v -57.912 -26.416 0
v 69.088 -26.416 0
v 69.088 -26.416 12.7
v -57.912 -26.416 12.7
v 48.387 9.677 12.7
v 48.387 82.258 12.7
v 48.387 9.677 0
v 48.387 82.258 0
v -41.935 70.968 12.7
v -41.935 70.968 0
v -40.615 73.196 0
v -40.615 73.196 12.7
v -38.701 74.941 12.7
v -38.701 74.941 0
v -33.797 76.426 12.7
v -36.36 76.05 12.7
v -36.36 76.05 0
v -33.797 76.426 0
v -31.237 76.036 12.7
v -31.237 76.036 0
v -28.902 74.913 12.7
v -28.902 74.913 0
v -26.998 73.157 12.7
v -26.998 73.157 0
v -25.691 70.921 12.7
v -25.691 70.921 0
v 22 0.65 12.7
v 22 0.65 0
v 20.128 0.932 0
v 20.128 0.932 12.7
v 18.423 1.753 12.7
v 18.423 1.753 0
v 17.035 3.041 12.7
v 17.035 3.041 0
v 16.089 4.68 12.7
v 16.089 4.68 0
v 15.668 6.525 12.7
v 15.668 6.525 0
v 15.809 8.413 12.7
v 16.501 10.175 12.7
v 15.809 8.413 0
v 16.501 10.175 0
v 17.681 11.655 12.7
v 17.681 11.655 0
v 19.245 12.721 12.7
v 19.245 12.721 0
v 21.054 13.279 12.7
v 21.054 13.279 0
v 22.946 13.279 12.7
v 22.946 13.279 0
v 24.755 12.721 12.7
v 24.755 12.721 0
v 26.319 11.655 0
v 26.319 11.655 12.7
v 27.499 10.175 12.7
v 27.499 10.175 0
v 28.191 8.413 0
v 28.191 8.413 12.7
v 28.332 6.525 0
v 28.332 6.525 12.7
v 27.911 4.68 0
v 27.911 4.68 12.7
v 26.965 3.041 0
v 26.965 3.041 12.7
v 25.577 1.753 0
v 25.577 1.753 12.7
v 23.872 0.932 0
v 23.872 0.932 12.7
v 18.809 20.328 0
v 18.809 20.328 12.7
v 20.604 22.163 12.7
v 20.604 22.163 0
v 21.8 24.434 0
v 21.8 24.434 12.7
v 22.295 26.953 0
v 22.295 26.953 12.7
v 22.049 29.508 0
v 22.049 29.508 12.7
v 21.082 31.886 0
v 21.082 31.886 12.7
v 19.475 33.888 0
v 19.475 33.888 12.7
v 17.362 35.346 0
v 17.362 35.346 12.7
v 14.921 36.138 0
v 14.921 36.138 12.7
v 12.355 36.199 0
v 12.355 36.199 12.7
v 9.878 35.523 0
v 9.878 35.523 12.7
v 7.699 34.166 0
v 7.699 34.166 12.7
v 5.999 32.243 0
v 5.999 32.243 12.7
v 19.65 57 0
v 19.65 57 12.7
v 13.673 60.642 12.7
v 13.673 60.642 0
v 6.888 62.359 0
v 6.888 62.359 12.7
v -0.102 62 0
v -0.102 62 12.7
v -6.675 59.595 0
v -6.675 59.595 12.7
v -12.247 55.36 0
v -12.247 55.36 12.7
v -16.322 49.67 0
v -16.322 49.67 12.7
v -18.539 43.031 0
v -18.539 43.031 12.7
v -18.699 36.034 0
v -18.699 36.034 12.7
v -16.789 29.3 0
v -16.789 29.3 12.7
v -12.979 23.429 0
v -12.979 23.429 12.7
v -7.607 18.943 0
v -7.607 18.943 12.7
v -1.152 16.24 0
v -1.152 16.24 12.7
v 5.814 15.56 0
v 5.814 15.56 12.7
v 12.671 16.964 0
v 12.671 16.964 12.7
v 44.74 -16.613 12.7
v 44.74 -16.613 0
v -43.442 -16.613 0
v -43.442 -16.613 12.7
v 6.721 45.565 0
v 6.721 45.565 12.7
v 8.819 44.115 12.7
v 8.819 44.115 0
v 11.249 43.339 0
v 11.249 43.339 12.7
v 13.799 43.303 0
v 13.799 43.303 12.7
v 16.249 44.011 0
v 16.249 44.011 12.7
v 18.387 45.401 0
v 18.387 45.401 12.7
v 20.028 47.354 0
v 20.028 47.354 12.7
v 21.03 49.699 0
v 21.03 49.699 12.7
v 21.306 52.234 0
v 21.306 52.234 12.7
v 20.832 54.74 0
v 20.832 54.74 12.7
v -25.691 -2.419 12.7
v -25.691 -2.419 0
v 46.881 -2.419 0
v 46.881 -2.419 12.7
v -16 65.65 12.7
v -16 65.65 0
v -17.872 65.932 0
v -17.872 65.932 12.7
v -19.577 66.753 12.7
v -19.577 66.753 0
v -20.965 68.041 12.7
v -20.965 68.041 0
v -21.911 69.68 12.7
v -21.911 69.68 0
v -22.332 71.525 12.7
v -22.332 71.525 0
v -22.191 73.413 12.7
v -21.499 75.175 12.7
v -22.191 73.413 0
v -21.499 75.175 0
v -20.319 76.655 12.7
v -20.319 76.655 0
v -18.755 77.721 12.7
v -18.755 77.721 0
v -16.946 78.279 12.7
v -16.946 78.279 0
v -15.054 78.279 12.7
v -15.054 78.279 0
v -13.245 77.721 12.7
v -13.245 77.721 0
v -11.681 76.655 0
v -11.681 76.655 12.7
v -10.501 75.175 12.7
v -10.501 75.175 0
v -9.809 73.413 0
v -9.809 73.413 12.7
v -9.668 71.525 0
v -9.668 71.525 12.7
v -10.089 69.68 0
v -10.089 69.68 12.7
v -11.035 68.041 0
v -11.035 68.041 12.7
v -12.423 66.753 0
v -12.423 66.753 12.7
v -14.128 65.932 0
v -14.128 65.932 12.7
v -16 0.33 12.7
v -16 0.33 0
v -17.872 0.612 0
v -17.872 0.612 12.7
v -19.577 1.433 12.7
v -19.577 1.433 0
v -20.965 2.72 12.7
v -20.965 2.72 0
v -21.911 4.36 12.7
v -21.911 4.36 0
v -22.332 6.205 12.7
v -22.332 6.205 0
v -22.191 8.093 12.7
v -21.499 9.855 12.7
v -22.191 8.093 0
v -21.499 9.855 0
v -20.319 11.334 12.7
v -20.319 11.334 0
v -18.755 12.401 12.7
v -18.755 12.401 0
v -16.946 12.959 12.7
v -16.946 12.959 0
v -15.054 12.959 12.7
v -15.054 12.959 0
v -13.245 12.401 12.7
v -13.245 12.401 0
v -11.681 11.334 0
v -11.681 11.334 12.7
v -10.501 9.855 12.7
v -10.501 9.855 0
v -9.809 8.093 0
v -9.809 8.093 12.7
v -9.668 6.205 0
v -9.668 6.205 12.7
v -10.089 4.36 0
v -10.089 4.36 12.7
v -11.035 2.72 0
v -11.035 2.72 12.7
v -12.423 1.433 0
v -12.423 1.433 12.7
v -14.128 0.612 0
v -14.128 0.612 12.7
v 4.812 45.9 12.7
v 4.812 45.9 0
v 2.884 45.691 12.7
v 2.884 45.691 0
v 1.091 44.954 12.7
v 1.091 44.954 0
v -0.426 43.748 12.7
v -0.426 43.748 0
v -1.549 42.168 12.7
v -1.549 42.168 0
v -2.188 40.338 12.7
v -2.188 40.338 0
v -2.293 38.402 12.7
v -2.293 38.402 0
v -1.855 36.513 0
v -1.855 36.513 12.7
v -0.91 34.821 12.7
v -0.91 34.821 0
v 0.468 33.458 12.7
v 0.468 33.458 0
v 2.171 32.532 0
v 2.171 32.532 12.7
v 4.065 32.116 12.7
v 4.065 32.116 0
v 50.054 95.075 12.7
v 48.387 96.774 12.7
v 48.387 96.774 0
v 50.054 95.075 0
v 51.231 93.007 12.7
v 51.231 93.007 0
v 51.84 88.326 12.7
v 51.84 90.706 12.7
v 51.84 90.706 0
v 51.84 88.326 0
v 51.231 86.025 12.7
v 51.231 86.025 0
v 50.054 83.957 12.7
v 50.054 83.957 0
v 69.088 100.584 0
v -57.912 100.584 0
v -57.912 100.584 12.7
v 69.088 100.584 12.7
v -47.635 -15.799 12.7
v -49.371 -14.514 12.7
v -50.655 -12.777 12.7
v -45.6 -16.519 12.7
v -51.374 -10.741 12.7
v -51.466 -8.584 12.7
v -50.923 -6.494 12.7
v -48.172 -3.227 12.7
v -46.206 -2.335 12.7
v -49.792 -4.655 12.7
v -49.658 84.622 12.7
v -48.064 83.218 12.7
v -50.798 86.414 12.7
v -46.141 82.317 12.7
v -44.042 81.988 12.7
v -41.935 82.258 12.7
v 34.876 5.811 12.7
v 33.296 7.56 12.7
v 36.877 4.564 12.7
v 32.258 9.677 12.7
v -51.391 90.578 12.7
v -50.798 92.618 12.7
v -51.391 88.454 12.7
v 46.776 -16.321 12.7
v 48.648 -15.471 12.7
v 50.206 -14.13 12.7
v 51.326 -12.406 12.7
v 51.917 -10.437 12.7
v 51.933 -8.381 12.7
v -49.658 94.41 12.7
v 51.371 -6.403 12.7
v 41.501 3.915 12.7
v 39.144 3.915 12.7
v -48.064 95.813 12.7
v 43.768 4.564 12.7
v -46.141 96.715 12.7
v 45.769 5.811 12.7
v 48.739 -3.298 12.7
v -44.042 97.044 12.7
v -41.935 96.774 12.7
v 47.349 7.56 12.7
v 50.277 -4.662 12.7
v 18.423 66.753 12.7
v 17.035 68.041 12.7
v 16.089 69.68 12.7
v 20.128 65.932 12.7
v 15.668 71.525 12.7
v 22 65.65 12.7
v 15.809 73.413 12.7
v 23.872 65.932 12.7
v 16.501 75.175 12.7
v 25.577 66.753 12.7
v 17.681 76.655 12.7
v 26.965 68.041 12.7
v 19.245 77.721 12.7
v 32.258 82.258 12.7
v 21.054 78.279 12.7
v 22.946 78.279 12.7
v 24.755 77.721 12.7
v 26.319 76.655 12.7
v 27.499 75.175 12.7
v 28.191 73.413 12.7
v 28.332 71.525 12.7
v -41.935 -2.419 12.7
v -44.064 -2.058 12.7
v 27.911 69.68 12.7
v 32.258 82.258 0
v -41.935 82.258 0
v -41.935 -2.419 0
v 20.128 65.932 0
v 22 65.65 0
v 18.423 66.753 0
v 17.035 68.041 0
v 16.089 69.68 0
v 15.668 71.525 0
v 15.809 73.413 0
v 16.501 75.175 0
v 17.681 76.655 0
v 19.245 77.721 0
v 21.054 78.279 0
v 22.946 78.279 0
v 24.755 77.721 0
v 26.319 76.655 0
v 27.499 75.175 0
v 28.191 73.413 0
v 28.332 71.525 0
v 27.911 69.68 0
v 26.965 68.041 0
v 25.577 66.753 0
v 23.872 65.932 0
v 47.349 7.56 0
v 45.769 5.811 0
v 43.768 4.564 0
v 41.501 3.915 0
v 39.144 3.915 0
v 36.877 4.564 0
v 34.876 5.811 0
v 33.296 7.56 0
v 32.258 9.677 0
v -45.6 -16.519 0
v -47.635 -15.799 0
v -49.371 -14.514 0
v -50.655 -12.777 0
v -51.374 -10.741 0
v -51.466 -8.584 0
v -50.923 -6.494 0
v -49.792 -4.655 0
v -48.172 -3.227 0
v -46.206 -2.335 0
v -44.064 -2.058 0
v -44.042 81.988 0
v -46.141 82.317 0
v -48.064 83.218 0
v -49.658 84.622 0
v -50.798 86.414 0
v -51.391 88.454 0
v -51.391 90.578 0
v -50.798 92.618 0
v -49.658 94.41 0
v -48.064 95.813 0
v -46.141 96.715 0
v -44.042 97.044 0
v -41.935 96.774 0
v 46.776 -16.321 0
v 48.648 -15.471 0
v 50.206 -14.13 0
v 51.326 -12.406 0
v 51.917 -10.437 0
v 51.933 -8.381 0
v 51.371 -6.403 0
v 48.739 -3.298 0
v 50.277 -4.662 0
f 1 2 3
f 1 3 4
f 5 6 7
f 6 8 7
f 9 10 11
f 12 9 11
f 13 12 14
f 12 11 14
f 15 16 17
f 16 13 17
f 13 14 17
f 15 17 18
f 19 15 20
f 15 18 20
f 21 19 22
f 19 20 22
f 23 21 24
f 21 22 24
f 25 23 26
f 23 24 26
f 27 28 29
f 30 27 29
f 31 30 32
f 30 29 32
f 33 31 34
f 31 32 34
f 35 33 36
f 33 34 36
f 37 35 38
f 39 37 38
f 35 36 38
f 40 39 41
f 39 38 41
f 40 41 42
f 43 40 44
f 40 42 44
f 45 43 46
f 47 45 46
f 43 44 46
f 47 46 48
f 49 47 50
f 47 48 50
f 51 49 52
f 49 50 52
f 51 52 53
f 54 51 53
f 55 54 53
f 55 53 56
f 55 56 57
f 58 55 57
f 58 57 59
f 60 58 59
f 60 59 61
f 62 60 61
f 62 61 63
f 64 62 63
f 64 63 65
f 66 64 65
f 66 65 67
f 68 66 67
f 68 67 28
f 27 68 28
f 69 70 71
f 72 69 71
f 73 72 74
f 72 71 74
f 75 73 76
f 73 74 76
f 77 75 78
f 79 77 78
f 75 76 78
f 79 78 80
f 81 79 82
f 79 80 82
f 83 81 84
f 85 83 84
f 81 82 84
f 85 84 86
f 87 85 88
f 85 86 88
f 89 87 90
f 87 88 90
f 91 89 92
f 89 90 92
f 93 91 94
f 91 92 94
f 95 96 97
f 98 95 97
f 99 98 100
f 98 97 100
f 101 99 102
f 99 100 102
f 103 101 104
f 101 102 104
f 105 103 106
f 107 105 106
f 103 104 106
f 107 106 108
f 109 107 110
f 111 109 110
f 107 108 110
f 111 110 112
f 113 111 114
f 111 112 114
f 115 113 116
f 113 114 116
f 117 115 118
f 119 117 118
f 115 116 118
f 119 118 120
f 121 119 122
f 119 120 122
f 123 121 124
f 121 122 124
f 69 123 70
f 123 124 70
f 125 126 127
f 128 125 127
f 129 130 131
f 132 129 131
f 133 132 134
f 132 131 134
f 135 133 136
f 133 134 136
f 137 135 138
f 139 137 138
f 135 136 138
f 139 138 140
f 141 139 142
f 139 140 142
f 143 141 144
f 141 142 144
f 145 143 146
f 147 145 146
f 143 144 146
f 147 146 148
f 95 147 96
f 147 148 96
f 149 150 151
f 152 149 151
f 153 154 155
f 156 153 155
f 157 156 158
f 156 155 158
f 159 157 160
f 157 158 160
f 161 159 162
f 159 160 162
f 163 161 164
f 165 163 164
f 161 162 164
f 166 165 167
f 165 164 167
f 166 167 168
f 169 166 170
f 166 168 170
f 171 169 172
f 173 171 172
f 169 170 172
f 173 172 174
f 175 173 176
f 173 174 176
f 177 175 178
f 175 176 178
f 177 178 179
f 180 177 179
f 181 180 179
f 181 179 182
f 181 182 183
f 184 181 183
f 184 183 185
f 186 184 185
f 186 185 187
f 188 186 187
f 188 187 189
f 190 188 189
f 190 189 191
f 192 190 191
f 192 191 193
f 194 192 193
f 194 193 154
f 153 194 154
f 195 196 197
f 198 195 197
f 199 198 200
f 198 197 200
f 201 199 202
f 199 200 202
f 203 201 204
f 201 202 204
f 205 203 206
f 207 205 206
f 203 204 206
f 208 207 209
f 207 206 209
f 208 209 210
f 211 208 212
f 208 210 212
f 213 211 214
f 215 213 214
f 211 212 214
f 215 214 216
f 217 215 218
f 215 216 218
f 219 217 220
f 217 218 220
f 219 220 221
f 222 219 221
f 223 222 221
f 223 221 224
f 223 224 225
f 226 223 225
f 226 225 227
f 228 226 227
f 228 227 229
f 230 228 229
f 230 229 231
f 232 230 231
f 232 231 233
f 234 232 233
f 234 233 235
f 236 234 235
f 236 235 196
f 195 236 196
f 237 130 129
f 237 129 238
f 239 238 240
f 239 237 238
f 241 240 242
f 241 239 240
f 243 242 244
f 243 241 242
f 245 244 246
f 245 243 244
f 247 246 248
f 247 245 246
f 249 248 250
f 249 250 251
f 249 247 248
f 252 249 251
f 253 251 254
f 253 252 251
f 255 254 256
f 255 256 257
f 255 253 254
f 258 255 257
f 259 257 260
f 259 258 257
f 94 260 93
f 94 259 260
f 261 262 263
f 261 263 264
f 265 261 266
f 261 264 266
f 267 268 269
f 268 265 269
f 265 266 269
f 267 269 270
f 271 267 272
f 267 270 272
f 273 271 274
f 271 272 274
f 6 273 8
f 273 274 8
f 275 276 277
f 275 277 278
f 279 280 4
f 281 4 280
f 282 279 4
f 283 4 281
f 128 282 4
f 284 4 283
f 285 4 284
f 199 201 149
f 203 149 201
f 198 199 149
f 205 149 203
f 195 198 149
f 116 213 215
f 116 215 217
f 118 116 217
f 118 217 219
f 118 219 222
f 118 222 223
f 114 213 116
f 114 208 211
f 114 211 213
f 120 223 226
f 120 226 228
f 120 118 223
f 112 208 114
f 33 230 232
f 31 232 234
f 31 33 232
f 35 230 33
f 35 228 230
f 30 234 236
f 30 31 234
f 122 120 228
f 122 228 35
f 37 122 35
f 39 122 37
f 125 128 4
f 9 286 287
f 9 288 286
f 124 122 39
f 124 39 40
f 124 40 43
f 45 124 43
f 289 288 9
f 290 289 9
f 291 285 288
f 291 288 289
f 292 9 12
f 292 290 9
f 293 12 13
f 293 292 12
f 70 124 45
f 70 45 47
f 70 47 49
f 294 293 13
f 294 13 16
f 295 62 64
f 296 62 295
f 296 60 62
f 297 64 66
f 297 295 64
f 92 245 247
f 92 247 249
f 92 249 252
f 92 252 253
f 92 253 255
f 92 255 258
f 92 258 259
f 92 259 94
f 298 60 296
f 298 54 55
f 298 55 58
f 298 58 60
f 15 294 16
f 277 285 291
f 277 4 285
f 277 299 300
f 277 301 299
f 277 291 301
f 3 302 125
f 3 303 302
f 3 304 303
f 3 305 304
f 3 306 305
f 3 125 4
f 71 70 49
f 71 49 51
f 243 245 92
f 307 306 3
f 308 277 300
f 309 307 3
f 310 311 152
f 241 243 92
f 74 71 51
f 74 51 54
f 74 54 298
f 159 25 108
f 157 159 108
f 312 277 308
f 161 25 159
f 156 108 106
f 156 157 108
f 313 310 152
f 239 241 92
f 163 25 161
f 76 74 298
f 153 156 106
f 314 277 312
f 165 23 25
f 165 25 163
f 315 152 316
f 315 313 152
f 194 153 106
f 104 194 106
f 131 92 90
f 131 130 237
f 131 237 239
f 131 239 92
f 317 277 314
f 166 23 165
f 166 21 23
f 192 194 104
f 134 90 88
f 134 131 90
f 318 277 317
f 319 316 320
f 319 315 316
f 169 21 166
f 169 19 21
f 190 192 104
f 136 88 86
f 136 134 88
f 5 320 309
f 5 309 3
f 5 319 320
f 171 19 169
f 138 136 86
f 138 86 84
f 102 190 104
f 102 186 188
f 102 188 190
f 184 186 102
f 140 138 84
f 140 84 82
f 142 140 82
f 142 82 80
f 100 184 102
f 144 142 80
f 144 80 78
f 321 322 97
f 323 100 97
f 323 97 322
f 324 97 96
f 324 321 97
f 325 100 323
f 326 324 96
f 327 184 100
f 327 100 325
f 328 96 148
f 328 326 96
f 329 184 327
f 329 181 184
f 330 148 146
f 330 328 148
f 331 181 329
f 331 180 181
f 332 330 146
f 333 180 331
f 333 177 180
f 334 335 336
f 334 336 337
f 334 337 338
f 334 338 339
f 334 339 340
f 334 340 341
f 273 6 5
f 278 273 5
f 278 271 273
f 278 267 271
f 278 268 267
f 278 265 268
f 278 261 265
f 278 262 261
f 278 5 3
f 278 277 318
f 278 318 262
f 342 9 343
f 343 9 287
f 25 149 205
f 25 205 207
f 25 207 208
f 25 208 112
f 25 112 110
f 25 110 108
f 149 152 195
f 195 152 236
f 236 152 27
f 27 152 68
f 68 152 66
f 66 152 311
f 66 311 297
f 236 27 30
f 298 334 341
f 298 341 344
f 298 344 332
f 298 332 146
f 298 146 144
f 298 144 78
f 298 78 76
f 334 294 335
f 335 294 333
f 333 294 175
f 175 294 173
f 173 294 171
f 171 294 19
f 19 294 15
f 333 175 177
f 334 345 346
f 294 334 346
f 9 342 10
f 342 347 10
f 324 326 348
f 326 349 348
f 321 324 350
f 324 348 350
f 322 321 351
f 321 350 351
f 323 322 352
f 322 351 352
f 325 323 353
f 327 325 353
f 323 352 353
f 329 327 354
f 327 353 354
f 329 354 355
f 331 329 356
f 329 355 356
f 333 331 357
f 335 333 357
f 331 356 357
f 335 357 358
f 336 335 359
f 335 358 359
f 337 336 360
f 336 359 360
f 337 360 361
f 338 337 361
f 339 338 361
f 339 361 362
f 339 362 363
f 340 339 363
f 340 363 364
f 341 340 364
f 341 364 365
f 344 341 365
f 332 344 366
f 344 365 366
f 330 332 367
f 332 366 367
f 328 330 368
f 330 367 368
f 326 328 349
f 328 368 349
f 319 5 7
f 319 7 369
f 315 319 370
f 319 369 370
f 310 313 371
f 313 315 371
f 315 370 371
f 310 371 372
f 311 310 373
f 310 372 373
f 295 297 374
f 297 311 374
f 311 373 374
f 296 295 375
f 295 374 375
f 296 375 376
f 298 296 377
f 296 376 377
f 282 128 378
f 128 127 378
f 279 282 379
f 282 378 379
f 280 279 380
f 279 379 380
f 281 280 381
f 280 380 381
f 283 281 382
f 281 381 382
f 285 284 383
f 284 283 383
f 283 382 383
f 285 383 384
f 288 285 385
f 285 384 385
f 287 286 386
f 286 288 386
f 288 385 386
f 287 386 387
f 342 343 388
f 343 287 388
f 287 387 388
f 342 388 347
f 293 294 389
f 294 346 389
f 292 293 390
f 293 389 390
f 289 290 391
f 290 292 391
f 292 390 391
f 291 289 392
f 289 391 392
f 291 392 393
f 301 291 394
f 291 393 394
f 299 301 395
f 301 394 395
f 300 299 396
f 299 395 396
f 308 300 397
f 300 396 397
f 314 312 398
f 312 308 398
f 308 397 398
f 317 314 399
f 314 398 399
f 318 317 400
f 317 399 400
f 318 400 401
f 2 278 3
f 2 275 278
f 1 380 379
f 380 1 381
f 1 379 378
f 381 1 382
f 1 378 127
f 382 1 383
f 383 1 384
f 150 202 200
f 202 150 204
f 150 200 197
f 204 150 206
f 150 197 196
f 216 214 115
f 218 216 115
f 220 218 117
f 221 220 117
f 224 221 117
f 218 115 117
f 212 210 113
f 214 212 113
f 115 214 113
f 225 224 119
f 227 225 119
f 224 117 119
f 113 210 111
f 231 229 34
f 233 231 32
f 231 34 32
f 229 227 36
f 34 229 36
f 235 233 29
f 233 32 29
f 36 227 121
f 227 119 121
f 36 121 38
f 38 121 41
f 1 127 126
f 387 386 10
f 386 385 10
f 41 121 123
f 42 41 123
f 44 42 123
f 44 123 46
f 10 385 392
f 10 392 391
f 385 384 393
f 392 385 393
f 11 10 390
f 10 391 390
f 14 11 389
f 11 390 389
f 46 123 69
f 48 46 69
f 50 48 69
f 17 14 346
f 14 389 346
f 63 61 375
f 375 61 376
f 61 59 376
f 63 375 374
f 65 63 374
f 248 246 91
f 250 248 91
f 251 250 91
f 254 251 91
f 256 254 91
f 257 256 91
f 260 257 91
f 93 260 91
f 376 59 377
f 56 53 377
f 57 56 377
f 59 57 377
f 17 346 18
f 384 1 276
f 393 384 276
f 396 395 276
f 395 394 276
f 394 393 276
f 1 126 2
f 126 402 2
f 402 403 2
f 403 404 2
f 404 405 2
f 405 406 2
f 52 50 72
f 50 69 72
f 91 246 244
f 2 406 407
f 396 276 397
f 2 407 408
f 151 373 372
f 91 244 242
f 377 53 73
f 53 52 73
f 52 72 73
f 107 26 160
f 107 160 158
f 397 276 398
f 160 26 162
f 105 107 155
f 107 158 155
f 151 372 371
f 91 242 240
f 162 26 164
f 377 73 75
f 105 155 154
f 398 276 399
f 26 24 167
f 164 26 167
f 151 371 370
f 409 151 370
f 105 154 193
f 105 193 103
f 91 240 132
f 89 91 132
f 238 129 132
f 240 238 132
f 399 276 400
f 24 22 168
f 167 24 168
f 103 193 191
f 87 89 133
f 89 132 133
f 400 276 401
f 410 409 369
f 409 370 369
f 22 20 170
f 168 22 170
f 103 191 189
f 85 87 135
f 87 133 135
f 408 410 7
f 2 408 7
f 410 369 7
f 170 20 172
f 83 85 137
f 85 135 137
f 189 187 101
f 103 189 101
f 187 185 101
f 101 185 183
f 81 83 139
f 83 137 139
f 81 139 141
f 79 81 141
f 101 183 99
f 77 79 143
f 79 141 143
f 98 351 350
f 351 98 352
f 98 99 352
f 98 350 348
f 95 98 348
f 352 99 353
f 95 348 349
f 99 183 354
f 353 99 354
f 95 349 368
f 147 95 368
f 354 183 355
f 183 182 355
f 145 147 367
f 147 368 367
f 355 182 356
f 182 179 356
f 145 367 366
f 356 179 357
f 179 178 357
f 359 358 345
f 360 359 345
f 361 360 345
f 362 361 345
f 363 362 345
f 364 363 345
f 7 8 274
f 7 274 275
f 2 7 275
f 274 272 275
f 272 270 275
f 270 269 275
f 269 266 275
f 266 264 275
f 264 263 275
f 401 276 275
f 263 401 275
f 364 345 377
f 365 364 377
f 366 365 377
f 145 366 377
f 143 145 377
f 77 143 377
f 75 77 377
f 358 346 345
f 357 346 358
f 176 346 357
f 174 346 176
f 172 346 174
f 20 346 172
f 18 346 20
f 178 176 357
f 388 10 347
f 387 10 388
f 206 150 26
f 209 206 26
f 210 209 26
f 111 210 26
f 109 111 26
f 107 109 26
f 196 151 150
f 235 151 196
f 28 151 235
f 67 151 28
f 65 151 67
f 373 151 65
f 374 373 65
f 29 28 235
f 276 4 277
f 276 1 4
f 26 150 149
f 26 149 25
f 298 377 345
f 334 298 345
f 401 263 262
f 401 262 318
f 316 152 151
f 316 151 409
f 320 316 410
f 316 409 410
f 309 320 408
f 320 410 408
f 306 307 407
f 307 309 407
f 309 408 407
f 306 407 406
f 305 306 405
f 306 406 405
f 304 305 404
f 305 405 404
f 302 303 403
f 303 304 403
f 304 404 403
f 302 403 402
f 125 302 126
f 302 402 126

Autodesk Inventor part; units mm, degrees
ref_plane "YZ Plane" through (0, 0, 0) normal (1, 0, 0) x (0, 1, 0)
ref_plane "XZ Plane" through (0, 0, 0) normal (0, 1, 0) x (-1, 0, 0)
ref_plane "XY Plane" through (0, 0, 0) normal (0, 0, 1) x (1, 0, 0)
sketch "Sketch1" plane through (0, 0, 0) normal (0, 0, 1) x (1, 0, 0)
  line L0 (44.7404, -16.6127) -> (-43.4425, -16.6127)
  arc A0 (44.7404, -16.6127) -> (46.8806, -2.4194) centre (44.7404, -9.3547) ccw
  arc A1 (-41.9354, -2.4194) -> (-43.4425, -16.6127) centre (-44.2086, -9.3547) ccw
  line L1 (48.387, 82.2579) -> (48.387, 9.6774)
  arc A2 (-25.6909, 70.9206) -> (-41.9354, 70.9676) centre (-33.8226, 67.6679) ccw
  line L2 (-41.9354, -2.4194) -> (-41.9354, 70.9676)
  line L3 (-25.6909, -2.4194) -> (-25.6909, 70.9206)
  line L4 (-25.6909, -2.4194) -> (46.8806, -2.4194)
  line L5 (-57.912, 100.584) -> (69.088, 100.584)
  line L6 (69.088, 100.584) -> (69.088, -26.416)
  line L7 (69.088, -26.416) -> (-57.912, -26.416)
  line L8 (-57.912, -26.416) -> (-57.912, 100.584)
  arc A3 (32.258, 9.6774) -> (48.387, 9.6774) centre (40.3225, 12.3185) ccw
  arc A4 (48.387, 82.2579) -> (48.387, 96.774) centre (42.691, 89.5159) ccw
  line L9 (32.258, 82.2579) -> (-41.9354, 82.2579)
  line L10 (48.387, 96.774) -> (-41.9354, 96.774)
  line L11 (32.258, 9.6774) -> (32.258, 82.2579)
  arc A5 (-41.9354, 96.774) -> (-41.9354, 82.2579) centre (-43.9372, 89.5159) ccw
  point P0 (0, 0)
  dimension "d0" = 127
  dimension "d1" = 127
extrude "Extrusion1" add sketch "Sketch1" along normal blind 12.7
sketch "Sketch2" plane through (0, 0, 12.7) normal (0, 0, 1) x (1, 0, 0)
  circle A0 centre (22, 7) radius 6.35
  circle A1 centre (-16, 6.6796) radius 6.35
  circle A2 centre (-16, 72) radius 6.35
  circle A3 centre (22, 72) radius 6.35
  point P0 (0, 0)
  dimension "d4" = 12.7
  dimension "d5" = 12.7
  dimension "d6" = 12.7
  dimension "d7" = 12.7
hole "Hole1" at (-16, 6.6796, 12.7) at (22, 72, 12.7) at (-16, 72, 12.7) at (22, 7, 12.7) direction (0, 0, -1) diameter 12.7 end through all
sketch "Sketch3" plane through (0, 0, 12.7) normal (0, 0, 1) x (1, 0, 0)
  arc A0 (20.8111, 55.9606) -> (21.1932, 22.4134) centre (4.585, 39) ccw
  arc A1 (8, 45) -> (8.4788, 33.299) centre (4.585, 39) ccw
  arc A2 (6.7211, 45.565) -> (19.6498, 57) centre (12.644, 51.8946) ccw
  arc A3 (18.8086, 20.3282) -> (5.9993, 32.2426) centre (13.4301, 27.3887) ccw
  circle A4 centre (-16, 72) radius 6.35 projected
  circle A5 centre (-16, 6.6796) radius 6.35 projected
  circle A6 centre (22, 72) radius 6.35 projected
  circle A7 centre (22, 7) radius 6.35 projected
  arc A8 (48.387, 82.2579) -> (48.387, 96.774) centre (42.691, 89.5159) ccw projected
  line L0 (48.387, 82.2579) -> (48.387, 9.6774) projected
  arc A9 (32.258, 9.6774) -> (48.387, 9.6774) centre (40.3225, 12.3185) ccw projected
  line L1 (32.258, 9.6774) -> (32.258, 82.2579) projected
  line L2 (32.258, 82.2579) -> (-41.9354, 82.2579) projected
  arc A10 (-41.9354, 96.774) -> (-41.9354, 82.2579) centre (-43.9372, 89.5159) ccw projected
  line L3 (-41.9354, 96.774) -> (48.387, 96.774) projected
  arc A11 (-41.9354, -2.4194) -> (-43.4425, -16.6127) centre (-44.2086, -9.3547) ccw projected
  line L4 (-41.9354, -2.4194) -> (-41.9354, 70.9676) projected
  arc A12 (-25.6909, 70.9206) -> (-41.9354, 70.9676) centre (-33.8226, 67.6679) ccw projected
  line L5 (-25.6909, 70.9206) -> (-25.6909, -2.4194) projected
  line L6 (-25.6909, -2.4194) -> (46.8806, -2.4194) projected
  arc A13 (44.7404, -16.6127) -> (46.8806, -2.4194) centre (44.7404, -9.3547) ccw projected
  line L7 (44.7404, -16.6127) -> (-43.4425, -16.6127) projected
  line L8 (69.088, 100.584) -> (-57.912, 100.584) projected
  line L9 (-57.912, 100.584) -> (-57.912, -26.416) projected
  line L10 (-57.912, -26.416) -> (69.088, -26.416) projected
  line L11 (69.088, -26.416) -> (69.088, 100.584) projected
  point P0 (0, 0)
  point P1 (20.2164, 21.4898)
  point P2 (20.9887, 55.7889)
emboss "Emboss1" sketch "Sketch3" operation cut depth 12.7 direction (0, 0, -1) contours A2 A1 A3 A0
properties part number "newnameC" material "Polyethylene, High Density"
